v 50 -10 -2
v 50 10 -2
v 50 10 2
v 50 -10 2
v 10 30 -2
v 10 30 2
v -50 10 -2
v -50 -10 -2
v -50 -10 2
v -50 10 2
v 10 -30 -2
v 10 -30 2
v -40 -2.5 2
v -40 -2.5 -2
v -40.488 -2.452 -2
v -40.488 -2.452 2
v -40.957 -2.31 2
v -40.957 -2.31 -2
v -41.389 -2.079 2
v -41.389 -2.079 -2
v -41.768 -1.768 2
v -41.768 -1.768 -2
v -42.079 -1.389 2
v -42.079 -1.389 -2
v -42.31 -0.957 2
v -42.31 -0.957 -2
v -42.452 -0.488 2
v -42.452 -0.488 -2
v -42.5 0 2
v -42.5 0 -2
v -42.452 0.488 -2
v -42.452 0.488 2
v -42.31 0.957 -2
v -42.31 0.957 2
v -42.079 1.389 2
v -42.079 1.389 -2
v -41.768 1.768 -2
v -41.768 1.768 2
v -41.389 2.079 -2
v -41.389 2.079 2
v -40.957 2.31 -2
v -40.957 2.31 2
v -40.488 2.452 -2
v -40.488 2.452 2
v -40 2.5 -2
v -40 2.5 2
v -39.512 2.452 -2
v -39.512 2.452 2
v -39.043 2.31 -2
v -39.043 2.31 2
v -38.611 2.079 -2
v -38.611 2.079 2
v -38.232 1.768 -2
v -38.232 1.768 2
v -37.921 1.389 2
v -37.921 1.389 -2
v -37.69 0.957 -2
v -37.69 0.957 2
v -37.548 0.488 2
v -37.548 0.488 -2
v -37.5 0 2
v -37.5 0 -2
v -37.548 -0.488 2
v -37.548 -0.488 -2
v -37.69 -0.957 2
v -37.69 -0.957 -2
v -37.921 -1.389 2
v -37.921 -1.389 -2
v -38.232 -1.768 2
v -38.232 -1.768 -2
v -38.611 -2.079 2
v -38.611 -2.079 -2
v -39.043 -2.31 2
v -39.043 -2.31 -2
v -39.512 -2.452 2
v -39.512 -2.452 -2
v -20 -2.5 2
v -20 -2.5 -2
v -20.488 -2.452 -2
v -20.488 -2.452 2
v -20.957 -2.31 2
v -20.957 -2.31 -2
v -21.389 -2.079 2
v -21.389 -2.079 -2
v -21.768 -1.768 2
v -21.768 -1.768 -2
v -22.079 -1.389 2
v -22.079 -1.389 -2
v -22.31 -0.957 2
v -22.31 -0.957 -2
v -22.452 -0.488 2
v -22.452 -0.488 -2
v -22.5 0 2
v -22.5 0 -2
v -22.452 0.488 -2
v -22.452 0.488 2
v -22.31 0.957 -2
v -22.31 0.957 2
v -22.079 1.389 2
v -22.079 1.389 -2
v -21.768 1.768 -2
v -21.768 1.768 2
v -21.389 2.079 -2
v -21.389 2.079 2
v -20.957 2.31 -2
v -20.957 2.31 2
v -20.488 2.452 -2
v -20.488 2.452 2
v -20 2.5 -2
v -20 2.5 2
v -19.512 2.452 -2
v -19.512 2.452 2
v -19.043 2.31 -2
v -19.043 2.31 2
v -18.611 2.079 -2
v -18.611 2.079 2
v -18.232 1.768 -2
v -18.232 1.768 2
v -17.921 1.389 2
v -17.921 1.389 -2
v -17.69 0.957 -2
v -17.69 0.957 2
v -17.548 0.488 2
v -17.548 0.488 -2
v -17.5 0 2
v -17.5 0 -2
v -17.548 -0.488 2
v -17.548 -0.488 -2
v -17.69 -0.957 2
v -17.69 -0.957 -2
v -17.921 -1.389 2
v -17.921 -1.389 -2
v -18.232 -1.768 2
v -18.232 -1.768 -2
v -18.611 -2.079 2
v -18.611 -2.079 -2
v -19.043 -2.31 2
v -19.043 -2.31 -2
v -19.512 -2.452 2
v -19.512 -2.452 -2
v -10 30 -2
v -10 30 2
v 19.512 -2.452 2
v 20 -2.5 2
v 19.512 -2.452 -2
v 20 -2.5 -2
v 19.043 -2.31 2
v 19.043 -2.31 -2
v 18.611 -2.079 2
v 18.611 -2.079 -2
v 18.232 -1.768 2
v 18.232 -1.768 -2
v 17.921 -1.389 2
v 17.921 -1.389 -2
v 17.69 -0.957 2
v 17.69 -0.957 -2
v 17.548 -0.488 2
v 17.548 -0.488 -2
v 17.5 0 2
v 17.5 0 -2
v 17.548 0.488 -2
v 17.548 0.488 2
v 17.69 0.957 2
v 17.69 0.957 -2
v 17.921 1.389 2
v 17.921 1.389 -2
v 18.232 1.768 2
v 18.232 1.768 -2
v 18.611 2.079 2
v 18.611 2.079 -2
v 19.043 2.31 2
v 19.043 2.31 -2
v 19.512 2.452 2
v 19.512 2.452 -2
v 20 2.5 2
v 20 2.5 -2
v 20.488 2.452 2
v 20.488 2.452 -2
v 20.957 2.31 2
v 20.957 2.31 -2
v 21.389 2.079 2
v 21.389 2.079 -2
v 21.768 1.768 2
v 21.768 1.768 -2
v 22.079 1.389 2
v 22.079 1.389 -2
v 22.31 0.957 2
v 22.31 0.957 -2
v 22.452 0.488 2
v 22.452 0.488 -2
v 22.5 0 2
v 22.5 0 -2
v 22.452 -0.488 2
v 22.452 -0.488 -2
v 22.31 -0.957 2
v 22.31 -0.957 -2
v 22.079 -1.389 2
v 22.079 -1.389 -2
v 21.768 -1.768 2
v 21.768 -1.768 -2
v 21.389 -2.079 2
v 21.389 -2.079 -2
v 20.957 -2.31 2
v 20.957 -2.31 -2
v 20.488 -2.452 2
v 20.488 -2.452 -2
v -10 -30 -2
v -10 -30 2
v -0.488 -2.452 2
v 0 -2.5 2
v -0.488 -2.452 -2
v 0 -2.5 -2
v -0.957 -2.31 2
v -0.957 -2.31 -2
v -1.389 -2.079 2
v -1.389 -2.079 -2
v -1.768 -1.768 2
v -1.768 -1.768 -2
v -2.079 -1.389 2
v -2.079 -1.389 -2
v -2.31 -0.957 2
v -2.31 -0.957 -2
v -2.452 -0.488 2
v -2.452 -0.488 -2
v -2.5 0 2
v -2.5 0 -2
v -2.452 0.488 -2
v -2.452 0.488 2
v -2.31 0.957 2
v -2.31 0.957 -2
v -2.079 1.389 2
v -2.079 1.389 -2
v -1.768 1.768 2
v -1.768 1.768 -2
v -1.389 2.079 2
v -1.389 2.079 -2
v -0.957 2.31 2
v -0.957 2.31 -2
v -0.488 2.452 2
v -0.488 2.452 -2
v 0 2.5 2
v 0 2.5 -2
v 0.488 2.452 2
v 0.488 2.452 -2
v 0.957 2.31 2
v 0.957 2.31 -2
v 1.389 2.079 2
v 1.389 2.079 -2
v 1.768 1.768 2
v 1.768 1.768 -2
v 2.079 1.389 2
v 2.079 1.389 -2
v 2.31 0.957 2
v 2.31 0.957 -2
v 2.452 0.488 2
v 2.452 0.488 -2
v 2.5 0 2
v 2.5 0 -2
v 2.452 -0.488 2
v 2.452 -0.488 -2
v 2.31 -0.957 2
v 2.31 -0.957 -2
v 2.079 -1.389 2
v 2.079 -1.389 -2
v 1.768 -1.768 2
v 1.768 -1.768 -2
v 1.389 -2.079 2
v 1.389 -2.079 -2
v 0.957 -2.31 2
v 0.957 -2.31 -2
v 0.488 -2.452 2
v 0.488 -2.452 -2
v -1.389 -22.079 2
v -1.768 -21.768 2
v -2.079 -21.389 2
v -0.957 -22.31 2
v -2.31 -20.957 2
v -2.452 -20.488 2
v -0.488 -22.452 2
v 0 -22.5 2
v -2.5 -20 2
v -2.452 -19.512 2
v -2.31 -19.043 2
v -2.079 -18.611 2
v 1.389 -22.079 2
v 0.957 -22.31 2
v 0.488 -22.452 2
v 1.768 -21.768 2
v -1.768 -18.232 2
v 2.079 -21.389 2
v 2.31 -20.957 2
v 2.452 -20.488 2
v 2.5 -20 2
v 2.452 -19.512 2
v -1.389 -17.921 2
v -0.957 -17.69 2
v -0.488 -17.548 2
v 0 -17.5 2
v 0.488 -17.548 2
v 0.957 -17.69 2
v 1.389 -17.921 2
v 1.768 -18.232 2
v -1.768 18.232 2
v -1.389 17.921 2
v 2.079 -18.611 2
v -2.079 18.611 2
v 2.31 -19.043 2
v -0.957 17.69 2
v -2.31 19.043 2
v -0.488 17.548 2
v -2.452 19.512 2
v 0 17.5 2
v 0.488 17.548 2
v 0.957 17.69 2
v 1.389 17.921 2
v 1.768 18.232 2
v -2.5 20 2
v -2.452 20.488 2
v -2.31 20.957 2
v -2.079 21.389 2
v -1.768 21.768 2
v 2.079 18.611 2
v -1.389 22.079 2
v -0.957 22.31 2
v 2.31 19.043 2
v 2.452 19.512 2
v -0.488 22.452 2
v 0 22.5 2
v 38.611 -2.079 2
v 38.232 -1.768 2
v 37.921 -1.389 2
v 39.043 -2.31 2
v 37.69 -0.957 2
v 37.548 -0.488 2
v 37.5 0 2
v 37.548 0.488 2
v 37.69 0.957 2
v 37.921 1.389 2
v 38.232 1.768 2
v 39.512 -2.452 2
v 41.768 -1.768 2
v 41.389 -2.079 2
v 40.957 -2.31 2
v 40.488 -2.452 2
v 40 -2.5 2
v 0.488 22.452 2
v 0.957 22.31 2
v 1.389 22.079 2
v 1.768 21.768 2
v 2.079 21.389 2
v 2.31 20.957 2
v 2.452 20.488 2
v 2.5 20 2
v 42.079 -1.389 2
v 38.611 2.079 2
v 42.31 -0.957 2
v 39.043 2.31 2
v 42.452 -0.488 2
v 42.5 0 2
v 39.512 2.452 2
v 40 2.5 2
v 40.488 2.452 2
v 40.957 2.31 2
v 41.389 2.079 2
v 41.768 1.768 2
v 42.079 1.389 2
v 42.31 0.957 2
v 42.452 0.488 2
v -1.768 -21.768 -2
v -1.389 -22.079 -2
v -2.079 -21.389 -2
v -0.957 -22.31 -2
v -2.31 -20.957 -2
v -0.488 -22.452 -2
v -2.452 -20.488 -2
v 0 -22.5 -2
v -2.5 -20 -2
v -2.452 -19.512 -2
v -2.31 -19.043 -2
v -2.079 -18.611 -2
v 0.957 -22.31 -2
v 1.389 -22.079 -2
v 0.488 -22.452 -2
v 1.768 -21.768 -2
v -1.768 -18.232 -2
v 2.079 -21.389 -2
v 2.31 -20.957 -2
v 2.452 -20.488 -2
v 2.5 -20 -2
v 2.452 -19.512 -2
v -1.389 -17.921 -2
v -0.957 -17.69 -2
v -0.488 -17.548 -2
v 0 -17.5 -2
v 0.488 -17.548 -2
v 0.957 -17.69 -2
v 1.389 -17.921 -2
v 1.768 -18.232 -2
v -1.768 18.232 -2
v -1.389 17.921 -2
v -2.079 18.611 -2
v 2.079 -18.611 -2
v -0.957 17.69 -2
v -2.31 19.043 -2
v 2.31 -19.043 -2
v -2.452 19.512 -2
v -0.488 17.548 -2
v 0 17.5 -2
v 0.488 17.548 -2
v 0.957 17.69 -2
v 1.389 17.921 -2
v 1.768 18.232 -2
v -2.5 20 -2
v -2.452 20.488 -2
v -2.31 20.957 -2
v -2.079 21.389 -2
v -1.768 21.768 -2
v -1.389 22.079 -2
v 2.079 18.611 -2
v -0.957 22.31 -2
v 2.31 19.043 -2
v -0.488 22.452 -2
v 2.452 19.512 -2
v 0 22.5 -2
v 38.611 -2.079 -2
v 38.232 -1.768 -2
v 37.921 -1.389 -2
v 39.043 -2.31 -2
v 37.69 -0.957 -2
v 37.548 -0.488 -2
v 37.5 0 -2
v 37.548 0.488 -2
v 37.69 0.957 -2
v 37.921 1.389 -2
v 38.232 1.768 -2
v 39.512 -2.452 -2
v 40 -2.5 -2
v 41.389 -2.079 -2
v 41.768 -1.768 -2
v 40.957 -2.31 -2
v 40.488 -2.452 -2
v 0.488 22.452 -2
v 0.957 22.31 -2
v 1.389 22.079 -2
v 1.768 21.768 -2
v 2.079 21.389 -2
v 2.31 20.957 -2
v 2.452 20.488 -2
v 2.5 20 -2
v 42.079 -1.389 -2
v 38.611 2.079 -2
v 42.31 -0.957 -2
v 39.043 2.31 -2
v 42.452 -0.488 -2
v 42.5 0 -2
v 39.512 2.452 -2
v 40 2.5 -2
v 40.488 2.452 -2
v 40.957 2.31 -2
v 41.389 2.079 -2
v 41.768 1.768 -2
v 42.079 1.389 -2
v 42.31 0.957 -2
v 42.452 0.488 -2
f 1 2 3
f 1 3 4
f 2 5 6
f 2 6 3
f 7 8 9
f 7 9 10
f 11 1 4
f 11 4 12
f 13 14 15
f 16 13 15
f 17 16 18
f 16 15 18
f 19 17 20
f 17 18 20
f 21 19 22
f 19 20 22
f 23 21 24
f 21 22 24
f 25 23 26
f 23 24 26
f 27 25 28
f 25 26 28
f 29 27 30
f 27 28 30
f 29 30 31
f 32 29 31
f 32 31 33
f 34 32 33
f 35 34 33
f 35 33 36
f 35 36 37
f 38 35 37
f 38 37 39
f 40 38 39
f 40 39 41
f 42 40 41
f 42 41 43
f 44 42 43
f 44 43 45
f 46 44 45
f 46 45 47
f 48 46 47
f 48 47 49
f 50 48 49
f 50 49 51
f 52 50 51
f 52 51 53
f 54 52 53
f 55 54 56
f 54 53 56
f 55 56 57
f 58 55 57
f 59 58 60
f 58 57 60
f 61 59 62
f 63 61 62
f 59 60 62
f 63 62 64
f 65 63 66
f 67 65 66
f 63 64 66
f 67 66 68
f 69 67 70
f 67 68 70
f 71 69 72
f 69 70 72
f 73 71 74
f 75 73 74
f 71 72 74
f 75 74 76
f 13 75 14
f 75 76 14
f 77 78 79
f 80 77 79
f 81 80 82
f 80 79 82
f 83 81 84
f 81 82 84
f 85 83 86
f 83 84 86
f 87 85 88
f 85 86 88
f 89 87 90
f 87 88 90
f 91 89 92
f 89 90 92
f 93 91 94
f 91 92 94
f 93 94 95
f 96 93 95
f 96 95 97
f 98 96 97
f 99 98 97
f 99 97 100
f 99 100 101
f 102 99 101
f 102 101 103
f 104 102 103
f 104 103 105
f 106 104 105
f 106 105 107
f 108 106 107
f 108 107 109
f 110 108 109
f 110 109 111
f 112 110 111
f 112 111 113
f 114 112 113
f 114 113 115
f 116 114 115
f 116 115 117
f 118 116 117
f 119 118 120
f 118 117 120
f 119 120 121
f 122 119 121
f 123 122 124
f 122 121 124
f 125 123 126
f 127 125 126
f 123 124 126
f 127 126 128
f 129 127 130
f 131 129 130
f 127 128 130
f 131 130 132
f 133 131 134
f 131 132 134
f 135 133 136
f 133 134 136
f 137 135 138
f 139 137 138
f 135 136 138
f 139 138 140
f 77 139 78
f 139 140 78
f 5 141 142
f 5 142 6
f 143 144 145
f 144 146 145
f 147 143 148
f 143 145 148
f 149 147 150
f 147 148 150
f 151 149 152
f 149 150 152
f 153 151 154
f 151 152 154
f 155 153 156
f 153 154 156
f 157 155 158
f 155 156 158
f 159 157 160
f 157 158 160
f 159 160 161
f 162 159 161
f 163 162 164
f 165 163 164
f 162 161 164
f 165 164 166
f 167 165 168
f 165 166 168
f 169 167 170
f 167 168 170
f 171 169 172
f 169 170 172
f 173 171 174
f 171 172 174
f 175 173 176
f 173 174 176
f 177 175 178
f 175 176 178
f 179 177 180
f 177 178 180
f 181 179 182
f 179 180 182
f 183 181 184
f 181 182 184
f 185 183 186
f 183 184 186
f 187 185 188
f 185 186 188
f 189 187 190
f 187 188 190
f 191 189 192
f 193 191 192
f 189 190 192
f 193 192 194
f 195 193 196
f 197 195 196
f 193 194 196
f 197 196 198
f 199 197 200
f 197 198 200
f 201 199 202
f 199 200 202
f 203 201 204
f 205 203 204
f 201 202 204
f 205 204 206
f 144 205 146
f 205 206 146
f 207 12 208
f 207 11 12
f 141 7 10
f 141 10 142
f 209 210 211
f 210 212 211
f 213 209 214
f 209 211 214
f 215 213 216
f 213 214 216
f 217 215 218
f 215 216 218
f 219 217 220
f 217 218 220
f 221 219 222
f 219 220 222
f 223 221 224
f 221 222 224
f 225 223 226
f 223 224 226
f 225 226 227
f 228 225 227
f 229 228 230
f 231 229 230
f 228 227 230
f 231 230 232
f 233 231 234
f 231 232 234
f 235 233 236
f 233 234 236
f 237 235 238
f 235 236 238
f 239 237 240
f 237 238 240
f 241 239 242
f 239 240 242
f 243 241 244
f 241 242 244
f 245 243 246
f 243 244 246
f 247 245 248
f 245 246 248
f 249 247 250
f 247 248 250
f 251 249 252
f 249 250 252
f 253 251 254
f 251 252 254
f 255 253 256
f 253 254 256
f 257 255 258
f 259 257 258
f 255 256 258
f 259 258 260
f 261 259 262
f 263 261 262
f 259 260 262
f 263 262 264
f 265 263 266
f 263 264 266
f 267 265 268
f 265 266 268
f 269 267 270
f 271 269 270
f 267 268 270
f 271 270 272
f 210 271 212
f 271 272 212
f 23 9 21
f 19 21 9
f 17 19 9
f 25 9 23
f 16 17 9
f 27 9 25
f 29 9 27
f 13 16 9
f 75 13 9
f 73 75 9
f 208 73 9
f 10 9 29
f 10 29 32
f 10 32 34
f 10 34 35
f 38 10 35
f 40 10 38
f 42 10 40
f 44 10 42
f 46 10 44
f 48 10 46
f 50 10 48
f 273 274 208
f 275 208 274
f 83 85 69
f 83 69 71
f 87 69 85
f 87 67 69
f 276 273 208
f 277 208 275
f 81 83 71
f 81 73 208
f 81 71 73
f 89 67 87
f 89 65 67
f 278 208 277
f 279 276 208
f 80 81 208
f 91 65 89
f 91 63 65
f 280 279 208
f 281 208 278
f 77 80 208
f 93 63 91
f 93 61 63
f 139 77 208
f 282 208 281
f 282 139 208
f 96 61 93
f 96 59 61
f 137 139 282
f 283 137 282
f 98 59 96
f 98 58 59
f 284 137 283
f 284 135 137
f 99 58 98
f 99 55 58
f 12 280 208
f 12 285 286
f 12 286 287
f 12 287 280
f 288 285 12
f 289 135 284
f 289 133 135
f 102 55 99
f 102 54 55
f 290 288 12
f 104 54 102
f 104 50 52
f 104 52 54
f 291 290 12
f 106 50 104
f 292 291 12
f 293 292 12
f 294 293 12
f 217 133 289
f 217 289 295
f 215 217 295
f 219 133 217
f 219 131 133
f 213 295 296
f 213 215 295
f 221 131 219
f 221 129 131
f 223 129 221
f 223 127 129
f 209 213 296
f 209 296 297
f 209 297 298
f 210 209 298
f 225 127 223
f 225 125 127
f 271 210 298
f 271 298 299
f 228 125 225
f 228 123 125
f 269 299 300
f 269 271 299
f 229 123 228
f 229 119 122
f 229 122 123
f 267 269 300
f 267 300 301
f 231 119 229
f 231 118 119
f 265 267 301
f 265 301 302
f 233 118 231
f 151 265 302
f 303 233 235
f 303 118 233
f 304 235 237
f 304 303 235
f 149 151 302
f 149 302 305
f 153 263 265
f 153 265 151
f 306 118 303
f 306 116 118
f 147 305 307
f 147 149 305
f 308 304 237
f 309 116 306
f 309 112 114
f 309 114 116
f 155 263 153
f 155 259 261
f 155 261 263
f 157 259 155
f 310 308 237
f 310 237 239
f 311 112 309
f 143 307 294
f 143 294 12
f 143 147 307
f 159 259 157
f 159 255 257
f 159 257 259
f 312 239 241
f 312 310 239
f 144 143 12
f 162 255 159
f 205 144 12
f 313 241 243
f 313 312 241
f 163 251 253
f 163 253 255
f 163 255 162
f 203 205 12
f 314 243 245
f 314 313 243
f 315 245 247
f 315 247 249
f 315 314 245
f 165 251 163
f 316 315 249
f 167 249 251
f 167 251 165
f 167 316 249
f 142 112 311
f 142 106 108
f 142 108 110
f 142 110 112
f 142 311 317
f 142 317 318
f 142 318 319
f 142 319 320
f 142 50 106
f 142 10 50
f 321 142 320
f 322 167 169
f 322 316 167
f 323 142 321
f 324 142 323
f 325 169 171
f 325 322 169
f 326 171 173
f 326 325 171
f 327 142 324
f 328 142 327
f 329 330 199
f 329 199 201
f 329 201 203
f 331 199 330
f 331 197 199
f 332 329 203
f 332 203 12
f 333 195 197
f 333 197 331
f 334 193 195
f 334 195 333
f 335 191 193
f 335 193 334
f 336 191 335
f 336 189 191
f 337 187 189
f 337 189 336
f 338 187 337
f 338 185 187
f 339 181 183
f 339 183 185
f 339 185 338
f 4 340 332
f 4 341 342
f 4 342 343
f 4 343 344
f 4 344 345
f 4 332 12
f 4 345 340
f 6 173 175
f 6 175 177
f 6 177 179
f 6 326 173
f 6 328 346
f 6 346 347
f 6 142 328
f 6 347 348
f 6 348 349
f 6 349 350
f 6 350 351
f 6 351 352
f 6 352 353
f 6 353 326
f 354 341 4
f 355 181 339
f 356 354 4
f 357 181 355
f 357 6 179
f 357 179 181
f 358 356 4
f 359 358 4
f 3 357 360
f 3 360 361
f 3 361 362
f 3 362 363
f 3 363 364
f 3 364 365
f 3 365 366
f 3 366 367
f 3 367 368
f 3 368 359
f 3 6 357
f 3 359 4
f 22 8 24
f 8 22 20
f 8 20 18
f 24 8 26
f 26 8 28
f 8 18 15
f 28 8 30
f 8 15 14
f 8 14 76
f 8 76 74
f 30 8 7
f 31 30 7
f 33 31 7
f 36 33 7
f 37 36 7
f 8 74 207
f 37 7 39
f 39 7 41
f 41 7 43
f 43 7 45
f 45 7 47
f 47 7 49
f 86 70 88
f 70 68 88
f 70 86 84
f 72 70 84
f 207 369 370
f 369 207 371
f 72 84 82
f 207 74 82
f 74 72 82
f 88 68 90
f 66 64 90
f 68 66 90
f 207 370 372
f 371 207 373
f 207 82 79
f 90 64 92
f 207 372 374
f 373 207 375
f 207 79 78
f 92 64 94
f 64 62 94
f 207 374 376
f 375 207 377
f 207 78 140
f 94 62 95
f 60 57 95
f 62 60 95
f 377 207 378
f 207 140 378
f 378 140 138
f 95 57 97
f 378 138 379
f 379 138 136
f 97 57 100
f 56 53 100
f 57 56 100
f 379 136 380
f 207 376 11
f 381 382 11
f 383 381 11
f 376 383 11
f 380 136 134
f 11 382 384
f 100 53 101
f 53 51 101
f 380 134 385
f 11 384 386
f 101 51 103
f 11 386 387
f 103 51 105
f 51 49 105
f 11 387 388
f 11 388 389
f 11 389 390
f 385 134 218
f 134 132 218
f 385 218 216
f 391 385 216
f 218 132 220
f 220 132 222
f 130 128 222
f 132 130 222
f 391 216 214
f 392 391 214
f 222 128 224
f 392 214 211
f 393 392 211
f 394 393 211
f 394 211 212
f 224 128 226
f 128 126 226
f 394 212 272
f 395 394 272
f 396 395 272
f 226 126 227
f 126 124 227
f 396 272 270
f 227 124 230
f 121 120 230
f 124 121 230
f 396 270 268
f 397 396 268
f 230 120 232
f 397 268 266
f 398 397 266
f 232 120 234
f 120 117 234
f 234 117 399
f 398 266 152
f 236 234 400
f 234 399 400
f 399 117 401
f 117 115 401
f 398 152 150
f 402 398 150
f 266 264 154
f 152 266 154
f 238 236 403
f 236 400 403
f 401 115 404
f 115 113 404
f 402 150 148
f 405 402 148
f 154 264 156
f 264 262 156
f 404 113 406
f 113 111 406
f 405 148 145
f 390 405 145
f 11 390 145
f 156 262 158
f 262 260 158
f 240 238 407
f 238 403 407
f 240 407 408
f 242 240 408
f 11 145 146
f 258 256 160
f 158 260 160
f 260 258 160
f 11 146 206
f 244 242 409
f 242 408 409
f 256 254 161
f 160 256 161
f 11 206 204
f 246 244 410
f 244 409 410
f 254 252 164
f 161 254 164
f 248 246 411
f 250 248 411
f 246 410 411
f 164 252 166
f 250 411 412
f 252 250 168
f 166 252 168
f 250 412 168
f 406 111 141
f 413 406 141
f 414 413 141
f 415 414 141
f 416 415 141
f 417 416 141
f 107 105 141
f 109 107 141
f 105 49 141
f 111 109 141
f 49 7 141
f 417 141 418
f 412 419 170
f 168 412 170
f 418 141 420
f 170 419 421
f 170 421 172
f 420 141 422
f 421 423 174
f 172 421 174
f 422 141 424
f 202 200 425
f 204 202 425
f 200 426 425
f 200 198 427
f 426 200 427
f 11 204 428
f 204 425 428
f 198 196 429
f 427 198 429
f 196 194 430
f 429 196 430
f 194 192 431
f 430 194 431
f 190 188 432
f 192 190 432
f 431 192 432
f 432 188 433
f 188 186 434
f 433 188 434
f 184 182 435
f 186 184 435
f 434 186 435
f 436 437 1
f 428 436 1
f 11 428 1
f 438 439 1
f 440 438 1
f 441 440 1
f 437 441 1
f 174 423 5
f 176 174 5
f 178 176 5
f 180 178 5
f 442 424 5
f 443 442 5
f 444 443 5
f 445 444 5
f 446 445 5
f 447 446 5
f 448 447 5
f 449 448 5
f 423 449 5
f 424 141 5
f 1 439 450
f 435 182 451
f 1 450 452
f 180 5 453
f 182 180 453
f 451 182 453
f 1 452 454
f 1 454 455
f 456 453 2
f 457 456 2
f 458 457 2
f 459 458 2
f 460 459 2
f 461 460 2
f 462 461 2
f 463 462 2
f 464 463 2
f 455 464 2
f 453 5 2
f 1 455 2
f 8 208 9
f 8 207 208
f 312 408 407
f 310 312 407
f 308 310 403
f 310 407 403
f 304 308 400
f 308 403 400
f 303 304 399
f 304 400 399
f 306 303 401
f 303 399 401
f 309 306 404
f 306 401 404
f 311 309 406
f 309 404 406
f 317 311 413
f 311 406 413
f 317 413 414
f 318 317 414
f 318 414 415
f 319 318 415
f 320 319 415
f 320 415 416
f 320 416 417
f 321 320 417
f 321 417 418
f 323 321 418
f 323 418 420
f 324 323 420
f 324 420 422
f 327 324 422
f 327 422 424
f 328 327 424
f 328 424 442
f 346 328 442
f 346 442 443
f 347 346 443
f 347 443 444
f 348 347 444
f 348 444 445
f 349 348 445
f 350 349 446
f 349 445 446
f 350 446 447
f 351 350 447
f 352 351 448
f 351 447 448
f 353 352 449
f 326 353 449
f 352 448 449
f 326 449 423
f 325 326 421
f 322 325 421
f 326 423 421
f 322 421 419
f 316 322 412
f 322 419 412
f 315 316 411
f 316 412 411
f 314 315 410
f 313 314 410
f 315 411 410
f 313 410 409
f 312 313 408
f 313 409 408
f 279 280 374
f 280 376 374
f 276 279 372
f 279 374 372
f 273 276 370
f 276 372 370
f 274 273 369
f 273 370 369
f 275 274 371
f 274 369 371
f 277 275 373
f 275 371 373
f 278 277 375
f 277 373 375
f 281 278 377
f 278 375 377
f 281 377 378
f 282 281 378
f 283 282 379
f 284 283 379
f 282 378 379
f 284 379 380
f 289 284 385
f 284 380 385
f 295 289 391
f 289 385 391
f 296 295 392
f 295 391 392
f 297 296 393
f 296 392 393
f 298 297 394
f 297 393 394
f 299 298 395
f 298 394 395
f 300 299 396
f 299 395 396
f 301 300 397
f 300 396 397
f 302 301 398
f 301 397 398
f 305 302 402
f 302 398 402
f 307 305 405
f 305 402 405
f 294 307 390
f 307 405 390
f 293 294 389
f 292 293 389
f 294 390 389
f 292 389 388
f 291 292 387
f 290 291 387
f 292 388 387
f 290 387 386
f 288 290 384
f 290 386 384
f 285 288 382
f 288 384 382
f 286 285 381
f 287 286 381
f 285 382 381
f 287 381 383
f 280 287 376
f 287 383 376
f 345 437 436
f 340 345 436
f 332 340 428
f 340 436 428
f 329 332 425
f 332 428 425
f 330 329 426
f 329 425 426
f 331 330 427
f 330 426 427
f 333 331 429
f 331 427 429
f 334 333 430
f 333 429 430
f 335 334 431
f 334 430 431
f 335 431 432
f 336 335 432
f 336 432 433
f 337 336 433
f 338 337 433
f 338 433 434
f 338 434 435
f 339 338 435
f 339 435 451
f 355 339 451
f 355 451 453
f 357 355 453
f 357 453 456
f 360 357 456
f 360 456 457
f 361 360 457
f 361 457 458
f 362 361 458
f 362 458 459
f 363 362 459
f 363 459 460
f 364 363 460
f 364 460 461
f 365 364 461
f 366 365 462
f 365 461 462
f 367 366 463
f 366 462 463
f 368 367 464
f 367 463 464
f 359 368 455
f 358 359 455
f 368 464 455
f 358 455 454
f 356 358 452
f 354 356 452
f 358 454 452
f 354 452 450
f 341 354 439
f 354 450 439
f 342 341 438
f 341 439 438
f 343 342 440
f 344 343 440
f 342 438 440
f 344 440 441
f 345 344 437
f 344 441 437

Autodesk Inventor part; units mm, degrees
ref_plane "YZ Plane" through (0, 0, 0) normal (1, 0, 0) x (0, 1, 0)
ref_plane "XZ Plane" through (0, 0, 0) normal (0, 1, 0) x (-1, 0, 0)
ref_plane "XY Plane" through (0, 0, 0) normal (0, 0, 1) x (1, 0, 0)
sketch "Sketch1" plane through (0, 0, 0) normal (0, 0, 1) x (1, 0, 0)
  line L0 (-50, 10) -> (50, 10) construction
  line L1 (50, 10) -> (50, -10) construction
  line L2 (50, -10) -> (-50, -10) construction
  line L3 (-50, -10) -> (-50, 10) construction
  line L4 (-50, 10) -> (50, -10) construction
  line L5 (50, 10) -> (-50, -10) construction
  line L6 (10, -30) -> (-10, -30) construction
  line L7 (-10, -30) -> (-10, 30) construction
  line L8 (-10, 30) -> (10, 30) construction
  line L9 (10, 30) -> (10, -30) construction
  line L10 (10, -30) -> (-10, 30) construction
  line L11 (-10, -30) -> (10, 30) construction
  line L12 (-50, 10) -> (-10, 30)
  line L13 (-10, 30) -> (10, 30)
  line L14 (10, 30) -> (50, 10)
  line L15 (50, 10) -> (50, -10)
  line L16 (50, -10) -> (10, -30)
  line L17 (10, -30) -> (-10, -30)
  line L18 (-10, -30) -> (-50, -10)
  line L19 (-50, -10) -> (-50, 10)
  point P0 (0, 0)
  dimension "d0" = 20
  dimension "d2" = 100
  dimension "d3" = 20
  dimension "d4" = 60
extrude "Extrusion1" add sketch "Sketch1" along normal mid plane 4
sketch "Sketch2" plane through (0, 0, 2) normal (0, 0, 1) x (1, 0, 0)
  line L0 (-50, 10) -> (-50, -10) projected
  line L1 (-10, -30) -> (10, -30) projected
  line L2 (50, -10) -> (50, 10) projected
  line L3 (10, 30) -> (-10, 30) projected
  line L4 (0, 30) -> (0, -30) construction
  line L5 (-50, 0) -> (50, 0) construction
  point P0 (0, 0)
  point P1 (0, 0)
  point P2 (20, 0)
  point P3 (40, 0)
  point P4 (0, 20)
  point P5 (0, -20)
  point P6 (-20, 0)
  point P7 (-40, 0)
  dimension "d7" = 20
  dimension "d9" = 20
  dimension "d10" = 20
  dimension "d11" = 20
  dimension "d12" = 20
  dimension "d13" = 20
hole "Hole1" at (0, 0, 2) at (20, 0, 2) at (40, 0, 2) at (0, 20, 2) at (0, -20, 2) at (-20, 0, 2) at (-40, 0, 2) direction (0, 0, -1) diameter 5 end through all
equation "\"d9\" = d7"
equation "\"d10\" = d7"
equation "\"d11\" = d10"
equation "\"d12\" = d11"
equation "\"d13\" = d10"
properties part number "7 Hole Cross Joining Plate" material "Aluminum 6061"
